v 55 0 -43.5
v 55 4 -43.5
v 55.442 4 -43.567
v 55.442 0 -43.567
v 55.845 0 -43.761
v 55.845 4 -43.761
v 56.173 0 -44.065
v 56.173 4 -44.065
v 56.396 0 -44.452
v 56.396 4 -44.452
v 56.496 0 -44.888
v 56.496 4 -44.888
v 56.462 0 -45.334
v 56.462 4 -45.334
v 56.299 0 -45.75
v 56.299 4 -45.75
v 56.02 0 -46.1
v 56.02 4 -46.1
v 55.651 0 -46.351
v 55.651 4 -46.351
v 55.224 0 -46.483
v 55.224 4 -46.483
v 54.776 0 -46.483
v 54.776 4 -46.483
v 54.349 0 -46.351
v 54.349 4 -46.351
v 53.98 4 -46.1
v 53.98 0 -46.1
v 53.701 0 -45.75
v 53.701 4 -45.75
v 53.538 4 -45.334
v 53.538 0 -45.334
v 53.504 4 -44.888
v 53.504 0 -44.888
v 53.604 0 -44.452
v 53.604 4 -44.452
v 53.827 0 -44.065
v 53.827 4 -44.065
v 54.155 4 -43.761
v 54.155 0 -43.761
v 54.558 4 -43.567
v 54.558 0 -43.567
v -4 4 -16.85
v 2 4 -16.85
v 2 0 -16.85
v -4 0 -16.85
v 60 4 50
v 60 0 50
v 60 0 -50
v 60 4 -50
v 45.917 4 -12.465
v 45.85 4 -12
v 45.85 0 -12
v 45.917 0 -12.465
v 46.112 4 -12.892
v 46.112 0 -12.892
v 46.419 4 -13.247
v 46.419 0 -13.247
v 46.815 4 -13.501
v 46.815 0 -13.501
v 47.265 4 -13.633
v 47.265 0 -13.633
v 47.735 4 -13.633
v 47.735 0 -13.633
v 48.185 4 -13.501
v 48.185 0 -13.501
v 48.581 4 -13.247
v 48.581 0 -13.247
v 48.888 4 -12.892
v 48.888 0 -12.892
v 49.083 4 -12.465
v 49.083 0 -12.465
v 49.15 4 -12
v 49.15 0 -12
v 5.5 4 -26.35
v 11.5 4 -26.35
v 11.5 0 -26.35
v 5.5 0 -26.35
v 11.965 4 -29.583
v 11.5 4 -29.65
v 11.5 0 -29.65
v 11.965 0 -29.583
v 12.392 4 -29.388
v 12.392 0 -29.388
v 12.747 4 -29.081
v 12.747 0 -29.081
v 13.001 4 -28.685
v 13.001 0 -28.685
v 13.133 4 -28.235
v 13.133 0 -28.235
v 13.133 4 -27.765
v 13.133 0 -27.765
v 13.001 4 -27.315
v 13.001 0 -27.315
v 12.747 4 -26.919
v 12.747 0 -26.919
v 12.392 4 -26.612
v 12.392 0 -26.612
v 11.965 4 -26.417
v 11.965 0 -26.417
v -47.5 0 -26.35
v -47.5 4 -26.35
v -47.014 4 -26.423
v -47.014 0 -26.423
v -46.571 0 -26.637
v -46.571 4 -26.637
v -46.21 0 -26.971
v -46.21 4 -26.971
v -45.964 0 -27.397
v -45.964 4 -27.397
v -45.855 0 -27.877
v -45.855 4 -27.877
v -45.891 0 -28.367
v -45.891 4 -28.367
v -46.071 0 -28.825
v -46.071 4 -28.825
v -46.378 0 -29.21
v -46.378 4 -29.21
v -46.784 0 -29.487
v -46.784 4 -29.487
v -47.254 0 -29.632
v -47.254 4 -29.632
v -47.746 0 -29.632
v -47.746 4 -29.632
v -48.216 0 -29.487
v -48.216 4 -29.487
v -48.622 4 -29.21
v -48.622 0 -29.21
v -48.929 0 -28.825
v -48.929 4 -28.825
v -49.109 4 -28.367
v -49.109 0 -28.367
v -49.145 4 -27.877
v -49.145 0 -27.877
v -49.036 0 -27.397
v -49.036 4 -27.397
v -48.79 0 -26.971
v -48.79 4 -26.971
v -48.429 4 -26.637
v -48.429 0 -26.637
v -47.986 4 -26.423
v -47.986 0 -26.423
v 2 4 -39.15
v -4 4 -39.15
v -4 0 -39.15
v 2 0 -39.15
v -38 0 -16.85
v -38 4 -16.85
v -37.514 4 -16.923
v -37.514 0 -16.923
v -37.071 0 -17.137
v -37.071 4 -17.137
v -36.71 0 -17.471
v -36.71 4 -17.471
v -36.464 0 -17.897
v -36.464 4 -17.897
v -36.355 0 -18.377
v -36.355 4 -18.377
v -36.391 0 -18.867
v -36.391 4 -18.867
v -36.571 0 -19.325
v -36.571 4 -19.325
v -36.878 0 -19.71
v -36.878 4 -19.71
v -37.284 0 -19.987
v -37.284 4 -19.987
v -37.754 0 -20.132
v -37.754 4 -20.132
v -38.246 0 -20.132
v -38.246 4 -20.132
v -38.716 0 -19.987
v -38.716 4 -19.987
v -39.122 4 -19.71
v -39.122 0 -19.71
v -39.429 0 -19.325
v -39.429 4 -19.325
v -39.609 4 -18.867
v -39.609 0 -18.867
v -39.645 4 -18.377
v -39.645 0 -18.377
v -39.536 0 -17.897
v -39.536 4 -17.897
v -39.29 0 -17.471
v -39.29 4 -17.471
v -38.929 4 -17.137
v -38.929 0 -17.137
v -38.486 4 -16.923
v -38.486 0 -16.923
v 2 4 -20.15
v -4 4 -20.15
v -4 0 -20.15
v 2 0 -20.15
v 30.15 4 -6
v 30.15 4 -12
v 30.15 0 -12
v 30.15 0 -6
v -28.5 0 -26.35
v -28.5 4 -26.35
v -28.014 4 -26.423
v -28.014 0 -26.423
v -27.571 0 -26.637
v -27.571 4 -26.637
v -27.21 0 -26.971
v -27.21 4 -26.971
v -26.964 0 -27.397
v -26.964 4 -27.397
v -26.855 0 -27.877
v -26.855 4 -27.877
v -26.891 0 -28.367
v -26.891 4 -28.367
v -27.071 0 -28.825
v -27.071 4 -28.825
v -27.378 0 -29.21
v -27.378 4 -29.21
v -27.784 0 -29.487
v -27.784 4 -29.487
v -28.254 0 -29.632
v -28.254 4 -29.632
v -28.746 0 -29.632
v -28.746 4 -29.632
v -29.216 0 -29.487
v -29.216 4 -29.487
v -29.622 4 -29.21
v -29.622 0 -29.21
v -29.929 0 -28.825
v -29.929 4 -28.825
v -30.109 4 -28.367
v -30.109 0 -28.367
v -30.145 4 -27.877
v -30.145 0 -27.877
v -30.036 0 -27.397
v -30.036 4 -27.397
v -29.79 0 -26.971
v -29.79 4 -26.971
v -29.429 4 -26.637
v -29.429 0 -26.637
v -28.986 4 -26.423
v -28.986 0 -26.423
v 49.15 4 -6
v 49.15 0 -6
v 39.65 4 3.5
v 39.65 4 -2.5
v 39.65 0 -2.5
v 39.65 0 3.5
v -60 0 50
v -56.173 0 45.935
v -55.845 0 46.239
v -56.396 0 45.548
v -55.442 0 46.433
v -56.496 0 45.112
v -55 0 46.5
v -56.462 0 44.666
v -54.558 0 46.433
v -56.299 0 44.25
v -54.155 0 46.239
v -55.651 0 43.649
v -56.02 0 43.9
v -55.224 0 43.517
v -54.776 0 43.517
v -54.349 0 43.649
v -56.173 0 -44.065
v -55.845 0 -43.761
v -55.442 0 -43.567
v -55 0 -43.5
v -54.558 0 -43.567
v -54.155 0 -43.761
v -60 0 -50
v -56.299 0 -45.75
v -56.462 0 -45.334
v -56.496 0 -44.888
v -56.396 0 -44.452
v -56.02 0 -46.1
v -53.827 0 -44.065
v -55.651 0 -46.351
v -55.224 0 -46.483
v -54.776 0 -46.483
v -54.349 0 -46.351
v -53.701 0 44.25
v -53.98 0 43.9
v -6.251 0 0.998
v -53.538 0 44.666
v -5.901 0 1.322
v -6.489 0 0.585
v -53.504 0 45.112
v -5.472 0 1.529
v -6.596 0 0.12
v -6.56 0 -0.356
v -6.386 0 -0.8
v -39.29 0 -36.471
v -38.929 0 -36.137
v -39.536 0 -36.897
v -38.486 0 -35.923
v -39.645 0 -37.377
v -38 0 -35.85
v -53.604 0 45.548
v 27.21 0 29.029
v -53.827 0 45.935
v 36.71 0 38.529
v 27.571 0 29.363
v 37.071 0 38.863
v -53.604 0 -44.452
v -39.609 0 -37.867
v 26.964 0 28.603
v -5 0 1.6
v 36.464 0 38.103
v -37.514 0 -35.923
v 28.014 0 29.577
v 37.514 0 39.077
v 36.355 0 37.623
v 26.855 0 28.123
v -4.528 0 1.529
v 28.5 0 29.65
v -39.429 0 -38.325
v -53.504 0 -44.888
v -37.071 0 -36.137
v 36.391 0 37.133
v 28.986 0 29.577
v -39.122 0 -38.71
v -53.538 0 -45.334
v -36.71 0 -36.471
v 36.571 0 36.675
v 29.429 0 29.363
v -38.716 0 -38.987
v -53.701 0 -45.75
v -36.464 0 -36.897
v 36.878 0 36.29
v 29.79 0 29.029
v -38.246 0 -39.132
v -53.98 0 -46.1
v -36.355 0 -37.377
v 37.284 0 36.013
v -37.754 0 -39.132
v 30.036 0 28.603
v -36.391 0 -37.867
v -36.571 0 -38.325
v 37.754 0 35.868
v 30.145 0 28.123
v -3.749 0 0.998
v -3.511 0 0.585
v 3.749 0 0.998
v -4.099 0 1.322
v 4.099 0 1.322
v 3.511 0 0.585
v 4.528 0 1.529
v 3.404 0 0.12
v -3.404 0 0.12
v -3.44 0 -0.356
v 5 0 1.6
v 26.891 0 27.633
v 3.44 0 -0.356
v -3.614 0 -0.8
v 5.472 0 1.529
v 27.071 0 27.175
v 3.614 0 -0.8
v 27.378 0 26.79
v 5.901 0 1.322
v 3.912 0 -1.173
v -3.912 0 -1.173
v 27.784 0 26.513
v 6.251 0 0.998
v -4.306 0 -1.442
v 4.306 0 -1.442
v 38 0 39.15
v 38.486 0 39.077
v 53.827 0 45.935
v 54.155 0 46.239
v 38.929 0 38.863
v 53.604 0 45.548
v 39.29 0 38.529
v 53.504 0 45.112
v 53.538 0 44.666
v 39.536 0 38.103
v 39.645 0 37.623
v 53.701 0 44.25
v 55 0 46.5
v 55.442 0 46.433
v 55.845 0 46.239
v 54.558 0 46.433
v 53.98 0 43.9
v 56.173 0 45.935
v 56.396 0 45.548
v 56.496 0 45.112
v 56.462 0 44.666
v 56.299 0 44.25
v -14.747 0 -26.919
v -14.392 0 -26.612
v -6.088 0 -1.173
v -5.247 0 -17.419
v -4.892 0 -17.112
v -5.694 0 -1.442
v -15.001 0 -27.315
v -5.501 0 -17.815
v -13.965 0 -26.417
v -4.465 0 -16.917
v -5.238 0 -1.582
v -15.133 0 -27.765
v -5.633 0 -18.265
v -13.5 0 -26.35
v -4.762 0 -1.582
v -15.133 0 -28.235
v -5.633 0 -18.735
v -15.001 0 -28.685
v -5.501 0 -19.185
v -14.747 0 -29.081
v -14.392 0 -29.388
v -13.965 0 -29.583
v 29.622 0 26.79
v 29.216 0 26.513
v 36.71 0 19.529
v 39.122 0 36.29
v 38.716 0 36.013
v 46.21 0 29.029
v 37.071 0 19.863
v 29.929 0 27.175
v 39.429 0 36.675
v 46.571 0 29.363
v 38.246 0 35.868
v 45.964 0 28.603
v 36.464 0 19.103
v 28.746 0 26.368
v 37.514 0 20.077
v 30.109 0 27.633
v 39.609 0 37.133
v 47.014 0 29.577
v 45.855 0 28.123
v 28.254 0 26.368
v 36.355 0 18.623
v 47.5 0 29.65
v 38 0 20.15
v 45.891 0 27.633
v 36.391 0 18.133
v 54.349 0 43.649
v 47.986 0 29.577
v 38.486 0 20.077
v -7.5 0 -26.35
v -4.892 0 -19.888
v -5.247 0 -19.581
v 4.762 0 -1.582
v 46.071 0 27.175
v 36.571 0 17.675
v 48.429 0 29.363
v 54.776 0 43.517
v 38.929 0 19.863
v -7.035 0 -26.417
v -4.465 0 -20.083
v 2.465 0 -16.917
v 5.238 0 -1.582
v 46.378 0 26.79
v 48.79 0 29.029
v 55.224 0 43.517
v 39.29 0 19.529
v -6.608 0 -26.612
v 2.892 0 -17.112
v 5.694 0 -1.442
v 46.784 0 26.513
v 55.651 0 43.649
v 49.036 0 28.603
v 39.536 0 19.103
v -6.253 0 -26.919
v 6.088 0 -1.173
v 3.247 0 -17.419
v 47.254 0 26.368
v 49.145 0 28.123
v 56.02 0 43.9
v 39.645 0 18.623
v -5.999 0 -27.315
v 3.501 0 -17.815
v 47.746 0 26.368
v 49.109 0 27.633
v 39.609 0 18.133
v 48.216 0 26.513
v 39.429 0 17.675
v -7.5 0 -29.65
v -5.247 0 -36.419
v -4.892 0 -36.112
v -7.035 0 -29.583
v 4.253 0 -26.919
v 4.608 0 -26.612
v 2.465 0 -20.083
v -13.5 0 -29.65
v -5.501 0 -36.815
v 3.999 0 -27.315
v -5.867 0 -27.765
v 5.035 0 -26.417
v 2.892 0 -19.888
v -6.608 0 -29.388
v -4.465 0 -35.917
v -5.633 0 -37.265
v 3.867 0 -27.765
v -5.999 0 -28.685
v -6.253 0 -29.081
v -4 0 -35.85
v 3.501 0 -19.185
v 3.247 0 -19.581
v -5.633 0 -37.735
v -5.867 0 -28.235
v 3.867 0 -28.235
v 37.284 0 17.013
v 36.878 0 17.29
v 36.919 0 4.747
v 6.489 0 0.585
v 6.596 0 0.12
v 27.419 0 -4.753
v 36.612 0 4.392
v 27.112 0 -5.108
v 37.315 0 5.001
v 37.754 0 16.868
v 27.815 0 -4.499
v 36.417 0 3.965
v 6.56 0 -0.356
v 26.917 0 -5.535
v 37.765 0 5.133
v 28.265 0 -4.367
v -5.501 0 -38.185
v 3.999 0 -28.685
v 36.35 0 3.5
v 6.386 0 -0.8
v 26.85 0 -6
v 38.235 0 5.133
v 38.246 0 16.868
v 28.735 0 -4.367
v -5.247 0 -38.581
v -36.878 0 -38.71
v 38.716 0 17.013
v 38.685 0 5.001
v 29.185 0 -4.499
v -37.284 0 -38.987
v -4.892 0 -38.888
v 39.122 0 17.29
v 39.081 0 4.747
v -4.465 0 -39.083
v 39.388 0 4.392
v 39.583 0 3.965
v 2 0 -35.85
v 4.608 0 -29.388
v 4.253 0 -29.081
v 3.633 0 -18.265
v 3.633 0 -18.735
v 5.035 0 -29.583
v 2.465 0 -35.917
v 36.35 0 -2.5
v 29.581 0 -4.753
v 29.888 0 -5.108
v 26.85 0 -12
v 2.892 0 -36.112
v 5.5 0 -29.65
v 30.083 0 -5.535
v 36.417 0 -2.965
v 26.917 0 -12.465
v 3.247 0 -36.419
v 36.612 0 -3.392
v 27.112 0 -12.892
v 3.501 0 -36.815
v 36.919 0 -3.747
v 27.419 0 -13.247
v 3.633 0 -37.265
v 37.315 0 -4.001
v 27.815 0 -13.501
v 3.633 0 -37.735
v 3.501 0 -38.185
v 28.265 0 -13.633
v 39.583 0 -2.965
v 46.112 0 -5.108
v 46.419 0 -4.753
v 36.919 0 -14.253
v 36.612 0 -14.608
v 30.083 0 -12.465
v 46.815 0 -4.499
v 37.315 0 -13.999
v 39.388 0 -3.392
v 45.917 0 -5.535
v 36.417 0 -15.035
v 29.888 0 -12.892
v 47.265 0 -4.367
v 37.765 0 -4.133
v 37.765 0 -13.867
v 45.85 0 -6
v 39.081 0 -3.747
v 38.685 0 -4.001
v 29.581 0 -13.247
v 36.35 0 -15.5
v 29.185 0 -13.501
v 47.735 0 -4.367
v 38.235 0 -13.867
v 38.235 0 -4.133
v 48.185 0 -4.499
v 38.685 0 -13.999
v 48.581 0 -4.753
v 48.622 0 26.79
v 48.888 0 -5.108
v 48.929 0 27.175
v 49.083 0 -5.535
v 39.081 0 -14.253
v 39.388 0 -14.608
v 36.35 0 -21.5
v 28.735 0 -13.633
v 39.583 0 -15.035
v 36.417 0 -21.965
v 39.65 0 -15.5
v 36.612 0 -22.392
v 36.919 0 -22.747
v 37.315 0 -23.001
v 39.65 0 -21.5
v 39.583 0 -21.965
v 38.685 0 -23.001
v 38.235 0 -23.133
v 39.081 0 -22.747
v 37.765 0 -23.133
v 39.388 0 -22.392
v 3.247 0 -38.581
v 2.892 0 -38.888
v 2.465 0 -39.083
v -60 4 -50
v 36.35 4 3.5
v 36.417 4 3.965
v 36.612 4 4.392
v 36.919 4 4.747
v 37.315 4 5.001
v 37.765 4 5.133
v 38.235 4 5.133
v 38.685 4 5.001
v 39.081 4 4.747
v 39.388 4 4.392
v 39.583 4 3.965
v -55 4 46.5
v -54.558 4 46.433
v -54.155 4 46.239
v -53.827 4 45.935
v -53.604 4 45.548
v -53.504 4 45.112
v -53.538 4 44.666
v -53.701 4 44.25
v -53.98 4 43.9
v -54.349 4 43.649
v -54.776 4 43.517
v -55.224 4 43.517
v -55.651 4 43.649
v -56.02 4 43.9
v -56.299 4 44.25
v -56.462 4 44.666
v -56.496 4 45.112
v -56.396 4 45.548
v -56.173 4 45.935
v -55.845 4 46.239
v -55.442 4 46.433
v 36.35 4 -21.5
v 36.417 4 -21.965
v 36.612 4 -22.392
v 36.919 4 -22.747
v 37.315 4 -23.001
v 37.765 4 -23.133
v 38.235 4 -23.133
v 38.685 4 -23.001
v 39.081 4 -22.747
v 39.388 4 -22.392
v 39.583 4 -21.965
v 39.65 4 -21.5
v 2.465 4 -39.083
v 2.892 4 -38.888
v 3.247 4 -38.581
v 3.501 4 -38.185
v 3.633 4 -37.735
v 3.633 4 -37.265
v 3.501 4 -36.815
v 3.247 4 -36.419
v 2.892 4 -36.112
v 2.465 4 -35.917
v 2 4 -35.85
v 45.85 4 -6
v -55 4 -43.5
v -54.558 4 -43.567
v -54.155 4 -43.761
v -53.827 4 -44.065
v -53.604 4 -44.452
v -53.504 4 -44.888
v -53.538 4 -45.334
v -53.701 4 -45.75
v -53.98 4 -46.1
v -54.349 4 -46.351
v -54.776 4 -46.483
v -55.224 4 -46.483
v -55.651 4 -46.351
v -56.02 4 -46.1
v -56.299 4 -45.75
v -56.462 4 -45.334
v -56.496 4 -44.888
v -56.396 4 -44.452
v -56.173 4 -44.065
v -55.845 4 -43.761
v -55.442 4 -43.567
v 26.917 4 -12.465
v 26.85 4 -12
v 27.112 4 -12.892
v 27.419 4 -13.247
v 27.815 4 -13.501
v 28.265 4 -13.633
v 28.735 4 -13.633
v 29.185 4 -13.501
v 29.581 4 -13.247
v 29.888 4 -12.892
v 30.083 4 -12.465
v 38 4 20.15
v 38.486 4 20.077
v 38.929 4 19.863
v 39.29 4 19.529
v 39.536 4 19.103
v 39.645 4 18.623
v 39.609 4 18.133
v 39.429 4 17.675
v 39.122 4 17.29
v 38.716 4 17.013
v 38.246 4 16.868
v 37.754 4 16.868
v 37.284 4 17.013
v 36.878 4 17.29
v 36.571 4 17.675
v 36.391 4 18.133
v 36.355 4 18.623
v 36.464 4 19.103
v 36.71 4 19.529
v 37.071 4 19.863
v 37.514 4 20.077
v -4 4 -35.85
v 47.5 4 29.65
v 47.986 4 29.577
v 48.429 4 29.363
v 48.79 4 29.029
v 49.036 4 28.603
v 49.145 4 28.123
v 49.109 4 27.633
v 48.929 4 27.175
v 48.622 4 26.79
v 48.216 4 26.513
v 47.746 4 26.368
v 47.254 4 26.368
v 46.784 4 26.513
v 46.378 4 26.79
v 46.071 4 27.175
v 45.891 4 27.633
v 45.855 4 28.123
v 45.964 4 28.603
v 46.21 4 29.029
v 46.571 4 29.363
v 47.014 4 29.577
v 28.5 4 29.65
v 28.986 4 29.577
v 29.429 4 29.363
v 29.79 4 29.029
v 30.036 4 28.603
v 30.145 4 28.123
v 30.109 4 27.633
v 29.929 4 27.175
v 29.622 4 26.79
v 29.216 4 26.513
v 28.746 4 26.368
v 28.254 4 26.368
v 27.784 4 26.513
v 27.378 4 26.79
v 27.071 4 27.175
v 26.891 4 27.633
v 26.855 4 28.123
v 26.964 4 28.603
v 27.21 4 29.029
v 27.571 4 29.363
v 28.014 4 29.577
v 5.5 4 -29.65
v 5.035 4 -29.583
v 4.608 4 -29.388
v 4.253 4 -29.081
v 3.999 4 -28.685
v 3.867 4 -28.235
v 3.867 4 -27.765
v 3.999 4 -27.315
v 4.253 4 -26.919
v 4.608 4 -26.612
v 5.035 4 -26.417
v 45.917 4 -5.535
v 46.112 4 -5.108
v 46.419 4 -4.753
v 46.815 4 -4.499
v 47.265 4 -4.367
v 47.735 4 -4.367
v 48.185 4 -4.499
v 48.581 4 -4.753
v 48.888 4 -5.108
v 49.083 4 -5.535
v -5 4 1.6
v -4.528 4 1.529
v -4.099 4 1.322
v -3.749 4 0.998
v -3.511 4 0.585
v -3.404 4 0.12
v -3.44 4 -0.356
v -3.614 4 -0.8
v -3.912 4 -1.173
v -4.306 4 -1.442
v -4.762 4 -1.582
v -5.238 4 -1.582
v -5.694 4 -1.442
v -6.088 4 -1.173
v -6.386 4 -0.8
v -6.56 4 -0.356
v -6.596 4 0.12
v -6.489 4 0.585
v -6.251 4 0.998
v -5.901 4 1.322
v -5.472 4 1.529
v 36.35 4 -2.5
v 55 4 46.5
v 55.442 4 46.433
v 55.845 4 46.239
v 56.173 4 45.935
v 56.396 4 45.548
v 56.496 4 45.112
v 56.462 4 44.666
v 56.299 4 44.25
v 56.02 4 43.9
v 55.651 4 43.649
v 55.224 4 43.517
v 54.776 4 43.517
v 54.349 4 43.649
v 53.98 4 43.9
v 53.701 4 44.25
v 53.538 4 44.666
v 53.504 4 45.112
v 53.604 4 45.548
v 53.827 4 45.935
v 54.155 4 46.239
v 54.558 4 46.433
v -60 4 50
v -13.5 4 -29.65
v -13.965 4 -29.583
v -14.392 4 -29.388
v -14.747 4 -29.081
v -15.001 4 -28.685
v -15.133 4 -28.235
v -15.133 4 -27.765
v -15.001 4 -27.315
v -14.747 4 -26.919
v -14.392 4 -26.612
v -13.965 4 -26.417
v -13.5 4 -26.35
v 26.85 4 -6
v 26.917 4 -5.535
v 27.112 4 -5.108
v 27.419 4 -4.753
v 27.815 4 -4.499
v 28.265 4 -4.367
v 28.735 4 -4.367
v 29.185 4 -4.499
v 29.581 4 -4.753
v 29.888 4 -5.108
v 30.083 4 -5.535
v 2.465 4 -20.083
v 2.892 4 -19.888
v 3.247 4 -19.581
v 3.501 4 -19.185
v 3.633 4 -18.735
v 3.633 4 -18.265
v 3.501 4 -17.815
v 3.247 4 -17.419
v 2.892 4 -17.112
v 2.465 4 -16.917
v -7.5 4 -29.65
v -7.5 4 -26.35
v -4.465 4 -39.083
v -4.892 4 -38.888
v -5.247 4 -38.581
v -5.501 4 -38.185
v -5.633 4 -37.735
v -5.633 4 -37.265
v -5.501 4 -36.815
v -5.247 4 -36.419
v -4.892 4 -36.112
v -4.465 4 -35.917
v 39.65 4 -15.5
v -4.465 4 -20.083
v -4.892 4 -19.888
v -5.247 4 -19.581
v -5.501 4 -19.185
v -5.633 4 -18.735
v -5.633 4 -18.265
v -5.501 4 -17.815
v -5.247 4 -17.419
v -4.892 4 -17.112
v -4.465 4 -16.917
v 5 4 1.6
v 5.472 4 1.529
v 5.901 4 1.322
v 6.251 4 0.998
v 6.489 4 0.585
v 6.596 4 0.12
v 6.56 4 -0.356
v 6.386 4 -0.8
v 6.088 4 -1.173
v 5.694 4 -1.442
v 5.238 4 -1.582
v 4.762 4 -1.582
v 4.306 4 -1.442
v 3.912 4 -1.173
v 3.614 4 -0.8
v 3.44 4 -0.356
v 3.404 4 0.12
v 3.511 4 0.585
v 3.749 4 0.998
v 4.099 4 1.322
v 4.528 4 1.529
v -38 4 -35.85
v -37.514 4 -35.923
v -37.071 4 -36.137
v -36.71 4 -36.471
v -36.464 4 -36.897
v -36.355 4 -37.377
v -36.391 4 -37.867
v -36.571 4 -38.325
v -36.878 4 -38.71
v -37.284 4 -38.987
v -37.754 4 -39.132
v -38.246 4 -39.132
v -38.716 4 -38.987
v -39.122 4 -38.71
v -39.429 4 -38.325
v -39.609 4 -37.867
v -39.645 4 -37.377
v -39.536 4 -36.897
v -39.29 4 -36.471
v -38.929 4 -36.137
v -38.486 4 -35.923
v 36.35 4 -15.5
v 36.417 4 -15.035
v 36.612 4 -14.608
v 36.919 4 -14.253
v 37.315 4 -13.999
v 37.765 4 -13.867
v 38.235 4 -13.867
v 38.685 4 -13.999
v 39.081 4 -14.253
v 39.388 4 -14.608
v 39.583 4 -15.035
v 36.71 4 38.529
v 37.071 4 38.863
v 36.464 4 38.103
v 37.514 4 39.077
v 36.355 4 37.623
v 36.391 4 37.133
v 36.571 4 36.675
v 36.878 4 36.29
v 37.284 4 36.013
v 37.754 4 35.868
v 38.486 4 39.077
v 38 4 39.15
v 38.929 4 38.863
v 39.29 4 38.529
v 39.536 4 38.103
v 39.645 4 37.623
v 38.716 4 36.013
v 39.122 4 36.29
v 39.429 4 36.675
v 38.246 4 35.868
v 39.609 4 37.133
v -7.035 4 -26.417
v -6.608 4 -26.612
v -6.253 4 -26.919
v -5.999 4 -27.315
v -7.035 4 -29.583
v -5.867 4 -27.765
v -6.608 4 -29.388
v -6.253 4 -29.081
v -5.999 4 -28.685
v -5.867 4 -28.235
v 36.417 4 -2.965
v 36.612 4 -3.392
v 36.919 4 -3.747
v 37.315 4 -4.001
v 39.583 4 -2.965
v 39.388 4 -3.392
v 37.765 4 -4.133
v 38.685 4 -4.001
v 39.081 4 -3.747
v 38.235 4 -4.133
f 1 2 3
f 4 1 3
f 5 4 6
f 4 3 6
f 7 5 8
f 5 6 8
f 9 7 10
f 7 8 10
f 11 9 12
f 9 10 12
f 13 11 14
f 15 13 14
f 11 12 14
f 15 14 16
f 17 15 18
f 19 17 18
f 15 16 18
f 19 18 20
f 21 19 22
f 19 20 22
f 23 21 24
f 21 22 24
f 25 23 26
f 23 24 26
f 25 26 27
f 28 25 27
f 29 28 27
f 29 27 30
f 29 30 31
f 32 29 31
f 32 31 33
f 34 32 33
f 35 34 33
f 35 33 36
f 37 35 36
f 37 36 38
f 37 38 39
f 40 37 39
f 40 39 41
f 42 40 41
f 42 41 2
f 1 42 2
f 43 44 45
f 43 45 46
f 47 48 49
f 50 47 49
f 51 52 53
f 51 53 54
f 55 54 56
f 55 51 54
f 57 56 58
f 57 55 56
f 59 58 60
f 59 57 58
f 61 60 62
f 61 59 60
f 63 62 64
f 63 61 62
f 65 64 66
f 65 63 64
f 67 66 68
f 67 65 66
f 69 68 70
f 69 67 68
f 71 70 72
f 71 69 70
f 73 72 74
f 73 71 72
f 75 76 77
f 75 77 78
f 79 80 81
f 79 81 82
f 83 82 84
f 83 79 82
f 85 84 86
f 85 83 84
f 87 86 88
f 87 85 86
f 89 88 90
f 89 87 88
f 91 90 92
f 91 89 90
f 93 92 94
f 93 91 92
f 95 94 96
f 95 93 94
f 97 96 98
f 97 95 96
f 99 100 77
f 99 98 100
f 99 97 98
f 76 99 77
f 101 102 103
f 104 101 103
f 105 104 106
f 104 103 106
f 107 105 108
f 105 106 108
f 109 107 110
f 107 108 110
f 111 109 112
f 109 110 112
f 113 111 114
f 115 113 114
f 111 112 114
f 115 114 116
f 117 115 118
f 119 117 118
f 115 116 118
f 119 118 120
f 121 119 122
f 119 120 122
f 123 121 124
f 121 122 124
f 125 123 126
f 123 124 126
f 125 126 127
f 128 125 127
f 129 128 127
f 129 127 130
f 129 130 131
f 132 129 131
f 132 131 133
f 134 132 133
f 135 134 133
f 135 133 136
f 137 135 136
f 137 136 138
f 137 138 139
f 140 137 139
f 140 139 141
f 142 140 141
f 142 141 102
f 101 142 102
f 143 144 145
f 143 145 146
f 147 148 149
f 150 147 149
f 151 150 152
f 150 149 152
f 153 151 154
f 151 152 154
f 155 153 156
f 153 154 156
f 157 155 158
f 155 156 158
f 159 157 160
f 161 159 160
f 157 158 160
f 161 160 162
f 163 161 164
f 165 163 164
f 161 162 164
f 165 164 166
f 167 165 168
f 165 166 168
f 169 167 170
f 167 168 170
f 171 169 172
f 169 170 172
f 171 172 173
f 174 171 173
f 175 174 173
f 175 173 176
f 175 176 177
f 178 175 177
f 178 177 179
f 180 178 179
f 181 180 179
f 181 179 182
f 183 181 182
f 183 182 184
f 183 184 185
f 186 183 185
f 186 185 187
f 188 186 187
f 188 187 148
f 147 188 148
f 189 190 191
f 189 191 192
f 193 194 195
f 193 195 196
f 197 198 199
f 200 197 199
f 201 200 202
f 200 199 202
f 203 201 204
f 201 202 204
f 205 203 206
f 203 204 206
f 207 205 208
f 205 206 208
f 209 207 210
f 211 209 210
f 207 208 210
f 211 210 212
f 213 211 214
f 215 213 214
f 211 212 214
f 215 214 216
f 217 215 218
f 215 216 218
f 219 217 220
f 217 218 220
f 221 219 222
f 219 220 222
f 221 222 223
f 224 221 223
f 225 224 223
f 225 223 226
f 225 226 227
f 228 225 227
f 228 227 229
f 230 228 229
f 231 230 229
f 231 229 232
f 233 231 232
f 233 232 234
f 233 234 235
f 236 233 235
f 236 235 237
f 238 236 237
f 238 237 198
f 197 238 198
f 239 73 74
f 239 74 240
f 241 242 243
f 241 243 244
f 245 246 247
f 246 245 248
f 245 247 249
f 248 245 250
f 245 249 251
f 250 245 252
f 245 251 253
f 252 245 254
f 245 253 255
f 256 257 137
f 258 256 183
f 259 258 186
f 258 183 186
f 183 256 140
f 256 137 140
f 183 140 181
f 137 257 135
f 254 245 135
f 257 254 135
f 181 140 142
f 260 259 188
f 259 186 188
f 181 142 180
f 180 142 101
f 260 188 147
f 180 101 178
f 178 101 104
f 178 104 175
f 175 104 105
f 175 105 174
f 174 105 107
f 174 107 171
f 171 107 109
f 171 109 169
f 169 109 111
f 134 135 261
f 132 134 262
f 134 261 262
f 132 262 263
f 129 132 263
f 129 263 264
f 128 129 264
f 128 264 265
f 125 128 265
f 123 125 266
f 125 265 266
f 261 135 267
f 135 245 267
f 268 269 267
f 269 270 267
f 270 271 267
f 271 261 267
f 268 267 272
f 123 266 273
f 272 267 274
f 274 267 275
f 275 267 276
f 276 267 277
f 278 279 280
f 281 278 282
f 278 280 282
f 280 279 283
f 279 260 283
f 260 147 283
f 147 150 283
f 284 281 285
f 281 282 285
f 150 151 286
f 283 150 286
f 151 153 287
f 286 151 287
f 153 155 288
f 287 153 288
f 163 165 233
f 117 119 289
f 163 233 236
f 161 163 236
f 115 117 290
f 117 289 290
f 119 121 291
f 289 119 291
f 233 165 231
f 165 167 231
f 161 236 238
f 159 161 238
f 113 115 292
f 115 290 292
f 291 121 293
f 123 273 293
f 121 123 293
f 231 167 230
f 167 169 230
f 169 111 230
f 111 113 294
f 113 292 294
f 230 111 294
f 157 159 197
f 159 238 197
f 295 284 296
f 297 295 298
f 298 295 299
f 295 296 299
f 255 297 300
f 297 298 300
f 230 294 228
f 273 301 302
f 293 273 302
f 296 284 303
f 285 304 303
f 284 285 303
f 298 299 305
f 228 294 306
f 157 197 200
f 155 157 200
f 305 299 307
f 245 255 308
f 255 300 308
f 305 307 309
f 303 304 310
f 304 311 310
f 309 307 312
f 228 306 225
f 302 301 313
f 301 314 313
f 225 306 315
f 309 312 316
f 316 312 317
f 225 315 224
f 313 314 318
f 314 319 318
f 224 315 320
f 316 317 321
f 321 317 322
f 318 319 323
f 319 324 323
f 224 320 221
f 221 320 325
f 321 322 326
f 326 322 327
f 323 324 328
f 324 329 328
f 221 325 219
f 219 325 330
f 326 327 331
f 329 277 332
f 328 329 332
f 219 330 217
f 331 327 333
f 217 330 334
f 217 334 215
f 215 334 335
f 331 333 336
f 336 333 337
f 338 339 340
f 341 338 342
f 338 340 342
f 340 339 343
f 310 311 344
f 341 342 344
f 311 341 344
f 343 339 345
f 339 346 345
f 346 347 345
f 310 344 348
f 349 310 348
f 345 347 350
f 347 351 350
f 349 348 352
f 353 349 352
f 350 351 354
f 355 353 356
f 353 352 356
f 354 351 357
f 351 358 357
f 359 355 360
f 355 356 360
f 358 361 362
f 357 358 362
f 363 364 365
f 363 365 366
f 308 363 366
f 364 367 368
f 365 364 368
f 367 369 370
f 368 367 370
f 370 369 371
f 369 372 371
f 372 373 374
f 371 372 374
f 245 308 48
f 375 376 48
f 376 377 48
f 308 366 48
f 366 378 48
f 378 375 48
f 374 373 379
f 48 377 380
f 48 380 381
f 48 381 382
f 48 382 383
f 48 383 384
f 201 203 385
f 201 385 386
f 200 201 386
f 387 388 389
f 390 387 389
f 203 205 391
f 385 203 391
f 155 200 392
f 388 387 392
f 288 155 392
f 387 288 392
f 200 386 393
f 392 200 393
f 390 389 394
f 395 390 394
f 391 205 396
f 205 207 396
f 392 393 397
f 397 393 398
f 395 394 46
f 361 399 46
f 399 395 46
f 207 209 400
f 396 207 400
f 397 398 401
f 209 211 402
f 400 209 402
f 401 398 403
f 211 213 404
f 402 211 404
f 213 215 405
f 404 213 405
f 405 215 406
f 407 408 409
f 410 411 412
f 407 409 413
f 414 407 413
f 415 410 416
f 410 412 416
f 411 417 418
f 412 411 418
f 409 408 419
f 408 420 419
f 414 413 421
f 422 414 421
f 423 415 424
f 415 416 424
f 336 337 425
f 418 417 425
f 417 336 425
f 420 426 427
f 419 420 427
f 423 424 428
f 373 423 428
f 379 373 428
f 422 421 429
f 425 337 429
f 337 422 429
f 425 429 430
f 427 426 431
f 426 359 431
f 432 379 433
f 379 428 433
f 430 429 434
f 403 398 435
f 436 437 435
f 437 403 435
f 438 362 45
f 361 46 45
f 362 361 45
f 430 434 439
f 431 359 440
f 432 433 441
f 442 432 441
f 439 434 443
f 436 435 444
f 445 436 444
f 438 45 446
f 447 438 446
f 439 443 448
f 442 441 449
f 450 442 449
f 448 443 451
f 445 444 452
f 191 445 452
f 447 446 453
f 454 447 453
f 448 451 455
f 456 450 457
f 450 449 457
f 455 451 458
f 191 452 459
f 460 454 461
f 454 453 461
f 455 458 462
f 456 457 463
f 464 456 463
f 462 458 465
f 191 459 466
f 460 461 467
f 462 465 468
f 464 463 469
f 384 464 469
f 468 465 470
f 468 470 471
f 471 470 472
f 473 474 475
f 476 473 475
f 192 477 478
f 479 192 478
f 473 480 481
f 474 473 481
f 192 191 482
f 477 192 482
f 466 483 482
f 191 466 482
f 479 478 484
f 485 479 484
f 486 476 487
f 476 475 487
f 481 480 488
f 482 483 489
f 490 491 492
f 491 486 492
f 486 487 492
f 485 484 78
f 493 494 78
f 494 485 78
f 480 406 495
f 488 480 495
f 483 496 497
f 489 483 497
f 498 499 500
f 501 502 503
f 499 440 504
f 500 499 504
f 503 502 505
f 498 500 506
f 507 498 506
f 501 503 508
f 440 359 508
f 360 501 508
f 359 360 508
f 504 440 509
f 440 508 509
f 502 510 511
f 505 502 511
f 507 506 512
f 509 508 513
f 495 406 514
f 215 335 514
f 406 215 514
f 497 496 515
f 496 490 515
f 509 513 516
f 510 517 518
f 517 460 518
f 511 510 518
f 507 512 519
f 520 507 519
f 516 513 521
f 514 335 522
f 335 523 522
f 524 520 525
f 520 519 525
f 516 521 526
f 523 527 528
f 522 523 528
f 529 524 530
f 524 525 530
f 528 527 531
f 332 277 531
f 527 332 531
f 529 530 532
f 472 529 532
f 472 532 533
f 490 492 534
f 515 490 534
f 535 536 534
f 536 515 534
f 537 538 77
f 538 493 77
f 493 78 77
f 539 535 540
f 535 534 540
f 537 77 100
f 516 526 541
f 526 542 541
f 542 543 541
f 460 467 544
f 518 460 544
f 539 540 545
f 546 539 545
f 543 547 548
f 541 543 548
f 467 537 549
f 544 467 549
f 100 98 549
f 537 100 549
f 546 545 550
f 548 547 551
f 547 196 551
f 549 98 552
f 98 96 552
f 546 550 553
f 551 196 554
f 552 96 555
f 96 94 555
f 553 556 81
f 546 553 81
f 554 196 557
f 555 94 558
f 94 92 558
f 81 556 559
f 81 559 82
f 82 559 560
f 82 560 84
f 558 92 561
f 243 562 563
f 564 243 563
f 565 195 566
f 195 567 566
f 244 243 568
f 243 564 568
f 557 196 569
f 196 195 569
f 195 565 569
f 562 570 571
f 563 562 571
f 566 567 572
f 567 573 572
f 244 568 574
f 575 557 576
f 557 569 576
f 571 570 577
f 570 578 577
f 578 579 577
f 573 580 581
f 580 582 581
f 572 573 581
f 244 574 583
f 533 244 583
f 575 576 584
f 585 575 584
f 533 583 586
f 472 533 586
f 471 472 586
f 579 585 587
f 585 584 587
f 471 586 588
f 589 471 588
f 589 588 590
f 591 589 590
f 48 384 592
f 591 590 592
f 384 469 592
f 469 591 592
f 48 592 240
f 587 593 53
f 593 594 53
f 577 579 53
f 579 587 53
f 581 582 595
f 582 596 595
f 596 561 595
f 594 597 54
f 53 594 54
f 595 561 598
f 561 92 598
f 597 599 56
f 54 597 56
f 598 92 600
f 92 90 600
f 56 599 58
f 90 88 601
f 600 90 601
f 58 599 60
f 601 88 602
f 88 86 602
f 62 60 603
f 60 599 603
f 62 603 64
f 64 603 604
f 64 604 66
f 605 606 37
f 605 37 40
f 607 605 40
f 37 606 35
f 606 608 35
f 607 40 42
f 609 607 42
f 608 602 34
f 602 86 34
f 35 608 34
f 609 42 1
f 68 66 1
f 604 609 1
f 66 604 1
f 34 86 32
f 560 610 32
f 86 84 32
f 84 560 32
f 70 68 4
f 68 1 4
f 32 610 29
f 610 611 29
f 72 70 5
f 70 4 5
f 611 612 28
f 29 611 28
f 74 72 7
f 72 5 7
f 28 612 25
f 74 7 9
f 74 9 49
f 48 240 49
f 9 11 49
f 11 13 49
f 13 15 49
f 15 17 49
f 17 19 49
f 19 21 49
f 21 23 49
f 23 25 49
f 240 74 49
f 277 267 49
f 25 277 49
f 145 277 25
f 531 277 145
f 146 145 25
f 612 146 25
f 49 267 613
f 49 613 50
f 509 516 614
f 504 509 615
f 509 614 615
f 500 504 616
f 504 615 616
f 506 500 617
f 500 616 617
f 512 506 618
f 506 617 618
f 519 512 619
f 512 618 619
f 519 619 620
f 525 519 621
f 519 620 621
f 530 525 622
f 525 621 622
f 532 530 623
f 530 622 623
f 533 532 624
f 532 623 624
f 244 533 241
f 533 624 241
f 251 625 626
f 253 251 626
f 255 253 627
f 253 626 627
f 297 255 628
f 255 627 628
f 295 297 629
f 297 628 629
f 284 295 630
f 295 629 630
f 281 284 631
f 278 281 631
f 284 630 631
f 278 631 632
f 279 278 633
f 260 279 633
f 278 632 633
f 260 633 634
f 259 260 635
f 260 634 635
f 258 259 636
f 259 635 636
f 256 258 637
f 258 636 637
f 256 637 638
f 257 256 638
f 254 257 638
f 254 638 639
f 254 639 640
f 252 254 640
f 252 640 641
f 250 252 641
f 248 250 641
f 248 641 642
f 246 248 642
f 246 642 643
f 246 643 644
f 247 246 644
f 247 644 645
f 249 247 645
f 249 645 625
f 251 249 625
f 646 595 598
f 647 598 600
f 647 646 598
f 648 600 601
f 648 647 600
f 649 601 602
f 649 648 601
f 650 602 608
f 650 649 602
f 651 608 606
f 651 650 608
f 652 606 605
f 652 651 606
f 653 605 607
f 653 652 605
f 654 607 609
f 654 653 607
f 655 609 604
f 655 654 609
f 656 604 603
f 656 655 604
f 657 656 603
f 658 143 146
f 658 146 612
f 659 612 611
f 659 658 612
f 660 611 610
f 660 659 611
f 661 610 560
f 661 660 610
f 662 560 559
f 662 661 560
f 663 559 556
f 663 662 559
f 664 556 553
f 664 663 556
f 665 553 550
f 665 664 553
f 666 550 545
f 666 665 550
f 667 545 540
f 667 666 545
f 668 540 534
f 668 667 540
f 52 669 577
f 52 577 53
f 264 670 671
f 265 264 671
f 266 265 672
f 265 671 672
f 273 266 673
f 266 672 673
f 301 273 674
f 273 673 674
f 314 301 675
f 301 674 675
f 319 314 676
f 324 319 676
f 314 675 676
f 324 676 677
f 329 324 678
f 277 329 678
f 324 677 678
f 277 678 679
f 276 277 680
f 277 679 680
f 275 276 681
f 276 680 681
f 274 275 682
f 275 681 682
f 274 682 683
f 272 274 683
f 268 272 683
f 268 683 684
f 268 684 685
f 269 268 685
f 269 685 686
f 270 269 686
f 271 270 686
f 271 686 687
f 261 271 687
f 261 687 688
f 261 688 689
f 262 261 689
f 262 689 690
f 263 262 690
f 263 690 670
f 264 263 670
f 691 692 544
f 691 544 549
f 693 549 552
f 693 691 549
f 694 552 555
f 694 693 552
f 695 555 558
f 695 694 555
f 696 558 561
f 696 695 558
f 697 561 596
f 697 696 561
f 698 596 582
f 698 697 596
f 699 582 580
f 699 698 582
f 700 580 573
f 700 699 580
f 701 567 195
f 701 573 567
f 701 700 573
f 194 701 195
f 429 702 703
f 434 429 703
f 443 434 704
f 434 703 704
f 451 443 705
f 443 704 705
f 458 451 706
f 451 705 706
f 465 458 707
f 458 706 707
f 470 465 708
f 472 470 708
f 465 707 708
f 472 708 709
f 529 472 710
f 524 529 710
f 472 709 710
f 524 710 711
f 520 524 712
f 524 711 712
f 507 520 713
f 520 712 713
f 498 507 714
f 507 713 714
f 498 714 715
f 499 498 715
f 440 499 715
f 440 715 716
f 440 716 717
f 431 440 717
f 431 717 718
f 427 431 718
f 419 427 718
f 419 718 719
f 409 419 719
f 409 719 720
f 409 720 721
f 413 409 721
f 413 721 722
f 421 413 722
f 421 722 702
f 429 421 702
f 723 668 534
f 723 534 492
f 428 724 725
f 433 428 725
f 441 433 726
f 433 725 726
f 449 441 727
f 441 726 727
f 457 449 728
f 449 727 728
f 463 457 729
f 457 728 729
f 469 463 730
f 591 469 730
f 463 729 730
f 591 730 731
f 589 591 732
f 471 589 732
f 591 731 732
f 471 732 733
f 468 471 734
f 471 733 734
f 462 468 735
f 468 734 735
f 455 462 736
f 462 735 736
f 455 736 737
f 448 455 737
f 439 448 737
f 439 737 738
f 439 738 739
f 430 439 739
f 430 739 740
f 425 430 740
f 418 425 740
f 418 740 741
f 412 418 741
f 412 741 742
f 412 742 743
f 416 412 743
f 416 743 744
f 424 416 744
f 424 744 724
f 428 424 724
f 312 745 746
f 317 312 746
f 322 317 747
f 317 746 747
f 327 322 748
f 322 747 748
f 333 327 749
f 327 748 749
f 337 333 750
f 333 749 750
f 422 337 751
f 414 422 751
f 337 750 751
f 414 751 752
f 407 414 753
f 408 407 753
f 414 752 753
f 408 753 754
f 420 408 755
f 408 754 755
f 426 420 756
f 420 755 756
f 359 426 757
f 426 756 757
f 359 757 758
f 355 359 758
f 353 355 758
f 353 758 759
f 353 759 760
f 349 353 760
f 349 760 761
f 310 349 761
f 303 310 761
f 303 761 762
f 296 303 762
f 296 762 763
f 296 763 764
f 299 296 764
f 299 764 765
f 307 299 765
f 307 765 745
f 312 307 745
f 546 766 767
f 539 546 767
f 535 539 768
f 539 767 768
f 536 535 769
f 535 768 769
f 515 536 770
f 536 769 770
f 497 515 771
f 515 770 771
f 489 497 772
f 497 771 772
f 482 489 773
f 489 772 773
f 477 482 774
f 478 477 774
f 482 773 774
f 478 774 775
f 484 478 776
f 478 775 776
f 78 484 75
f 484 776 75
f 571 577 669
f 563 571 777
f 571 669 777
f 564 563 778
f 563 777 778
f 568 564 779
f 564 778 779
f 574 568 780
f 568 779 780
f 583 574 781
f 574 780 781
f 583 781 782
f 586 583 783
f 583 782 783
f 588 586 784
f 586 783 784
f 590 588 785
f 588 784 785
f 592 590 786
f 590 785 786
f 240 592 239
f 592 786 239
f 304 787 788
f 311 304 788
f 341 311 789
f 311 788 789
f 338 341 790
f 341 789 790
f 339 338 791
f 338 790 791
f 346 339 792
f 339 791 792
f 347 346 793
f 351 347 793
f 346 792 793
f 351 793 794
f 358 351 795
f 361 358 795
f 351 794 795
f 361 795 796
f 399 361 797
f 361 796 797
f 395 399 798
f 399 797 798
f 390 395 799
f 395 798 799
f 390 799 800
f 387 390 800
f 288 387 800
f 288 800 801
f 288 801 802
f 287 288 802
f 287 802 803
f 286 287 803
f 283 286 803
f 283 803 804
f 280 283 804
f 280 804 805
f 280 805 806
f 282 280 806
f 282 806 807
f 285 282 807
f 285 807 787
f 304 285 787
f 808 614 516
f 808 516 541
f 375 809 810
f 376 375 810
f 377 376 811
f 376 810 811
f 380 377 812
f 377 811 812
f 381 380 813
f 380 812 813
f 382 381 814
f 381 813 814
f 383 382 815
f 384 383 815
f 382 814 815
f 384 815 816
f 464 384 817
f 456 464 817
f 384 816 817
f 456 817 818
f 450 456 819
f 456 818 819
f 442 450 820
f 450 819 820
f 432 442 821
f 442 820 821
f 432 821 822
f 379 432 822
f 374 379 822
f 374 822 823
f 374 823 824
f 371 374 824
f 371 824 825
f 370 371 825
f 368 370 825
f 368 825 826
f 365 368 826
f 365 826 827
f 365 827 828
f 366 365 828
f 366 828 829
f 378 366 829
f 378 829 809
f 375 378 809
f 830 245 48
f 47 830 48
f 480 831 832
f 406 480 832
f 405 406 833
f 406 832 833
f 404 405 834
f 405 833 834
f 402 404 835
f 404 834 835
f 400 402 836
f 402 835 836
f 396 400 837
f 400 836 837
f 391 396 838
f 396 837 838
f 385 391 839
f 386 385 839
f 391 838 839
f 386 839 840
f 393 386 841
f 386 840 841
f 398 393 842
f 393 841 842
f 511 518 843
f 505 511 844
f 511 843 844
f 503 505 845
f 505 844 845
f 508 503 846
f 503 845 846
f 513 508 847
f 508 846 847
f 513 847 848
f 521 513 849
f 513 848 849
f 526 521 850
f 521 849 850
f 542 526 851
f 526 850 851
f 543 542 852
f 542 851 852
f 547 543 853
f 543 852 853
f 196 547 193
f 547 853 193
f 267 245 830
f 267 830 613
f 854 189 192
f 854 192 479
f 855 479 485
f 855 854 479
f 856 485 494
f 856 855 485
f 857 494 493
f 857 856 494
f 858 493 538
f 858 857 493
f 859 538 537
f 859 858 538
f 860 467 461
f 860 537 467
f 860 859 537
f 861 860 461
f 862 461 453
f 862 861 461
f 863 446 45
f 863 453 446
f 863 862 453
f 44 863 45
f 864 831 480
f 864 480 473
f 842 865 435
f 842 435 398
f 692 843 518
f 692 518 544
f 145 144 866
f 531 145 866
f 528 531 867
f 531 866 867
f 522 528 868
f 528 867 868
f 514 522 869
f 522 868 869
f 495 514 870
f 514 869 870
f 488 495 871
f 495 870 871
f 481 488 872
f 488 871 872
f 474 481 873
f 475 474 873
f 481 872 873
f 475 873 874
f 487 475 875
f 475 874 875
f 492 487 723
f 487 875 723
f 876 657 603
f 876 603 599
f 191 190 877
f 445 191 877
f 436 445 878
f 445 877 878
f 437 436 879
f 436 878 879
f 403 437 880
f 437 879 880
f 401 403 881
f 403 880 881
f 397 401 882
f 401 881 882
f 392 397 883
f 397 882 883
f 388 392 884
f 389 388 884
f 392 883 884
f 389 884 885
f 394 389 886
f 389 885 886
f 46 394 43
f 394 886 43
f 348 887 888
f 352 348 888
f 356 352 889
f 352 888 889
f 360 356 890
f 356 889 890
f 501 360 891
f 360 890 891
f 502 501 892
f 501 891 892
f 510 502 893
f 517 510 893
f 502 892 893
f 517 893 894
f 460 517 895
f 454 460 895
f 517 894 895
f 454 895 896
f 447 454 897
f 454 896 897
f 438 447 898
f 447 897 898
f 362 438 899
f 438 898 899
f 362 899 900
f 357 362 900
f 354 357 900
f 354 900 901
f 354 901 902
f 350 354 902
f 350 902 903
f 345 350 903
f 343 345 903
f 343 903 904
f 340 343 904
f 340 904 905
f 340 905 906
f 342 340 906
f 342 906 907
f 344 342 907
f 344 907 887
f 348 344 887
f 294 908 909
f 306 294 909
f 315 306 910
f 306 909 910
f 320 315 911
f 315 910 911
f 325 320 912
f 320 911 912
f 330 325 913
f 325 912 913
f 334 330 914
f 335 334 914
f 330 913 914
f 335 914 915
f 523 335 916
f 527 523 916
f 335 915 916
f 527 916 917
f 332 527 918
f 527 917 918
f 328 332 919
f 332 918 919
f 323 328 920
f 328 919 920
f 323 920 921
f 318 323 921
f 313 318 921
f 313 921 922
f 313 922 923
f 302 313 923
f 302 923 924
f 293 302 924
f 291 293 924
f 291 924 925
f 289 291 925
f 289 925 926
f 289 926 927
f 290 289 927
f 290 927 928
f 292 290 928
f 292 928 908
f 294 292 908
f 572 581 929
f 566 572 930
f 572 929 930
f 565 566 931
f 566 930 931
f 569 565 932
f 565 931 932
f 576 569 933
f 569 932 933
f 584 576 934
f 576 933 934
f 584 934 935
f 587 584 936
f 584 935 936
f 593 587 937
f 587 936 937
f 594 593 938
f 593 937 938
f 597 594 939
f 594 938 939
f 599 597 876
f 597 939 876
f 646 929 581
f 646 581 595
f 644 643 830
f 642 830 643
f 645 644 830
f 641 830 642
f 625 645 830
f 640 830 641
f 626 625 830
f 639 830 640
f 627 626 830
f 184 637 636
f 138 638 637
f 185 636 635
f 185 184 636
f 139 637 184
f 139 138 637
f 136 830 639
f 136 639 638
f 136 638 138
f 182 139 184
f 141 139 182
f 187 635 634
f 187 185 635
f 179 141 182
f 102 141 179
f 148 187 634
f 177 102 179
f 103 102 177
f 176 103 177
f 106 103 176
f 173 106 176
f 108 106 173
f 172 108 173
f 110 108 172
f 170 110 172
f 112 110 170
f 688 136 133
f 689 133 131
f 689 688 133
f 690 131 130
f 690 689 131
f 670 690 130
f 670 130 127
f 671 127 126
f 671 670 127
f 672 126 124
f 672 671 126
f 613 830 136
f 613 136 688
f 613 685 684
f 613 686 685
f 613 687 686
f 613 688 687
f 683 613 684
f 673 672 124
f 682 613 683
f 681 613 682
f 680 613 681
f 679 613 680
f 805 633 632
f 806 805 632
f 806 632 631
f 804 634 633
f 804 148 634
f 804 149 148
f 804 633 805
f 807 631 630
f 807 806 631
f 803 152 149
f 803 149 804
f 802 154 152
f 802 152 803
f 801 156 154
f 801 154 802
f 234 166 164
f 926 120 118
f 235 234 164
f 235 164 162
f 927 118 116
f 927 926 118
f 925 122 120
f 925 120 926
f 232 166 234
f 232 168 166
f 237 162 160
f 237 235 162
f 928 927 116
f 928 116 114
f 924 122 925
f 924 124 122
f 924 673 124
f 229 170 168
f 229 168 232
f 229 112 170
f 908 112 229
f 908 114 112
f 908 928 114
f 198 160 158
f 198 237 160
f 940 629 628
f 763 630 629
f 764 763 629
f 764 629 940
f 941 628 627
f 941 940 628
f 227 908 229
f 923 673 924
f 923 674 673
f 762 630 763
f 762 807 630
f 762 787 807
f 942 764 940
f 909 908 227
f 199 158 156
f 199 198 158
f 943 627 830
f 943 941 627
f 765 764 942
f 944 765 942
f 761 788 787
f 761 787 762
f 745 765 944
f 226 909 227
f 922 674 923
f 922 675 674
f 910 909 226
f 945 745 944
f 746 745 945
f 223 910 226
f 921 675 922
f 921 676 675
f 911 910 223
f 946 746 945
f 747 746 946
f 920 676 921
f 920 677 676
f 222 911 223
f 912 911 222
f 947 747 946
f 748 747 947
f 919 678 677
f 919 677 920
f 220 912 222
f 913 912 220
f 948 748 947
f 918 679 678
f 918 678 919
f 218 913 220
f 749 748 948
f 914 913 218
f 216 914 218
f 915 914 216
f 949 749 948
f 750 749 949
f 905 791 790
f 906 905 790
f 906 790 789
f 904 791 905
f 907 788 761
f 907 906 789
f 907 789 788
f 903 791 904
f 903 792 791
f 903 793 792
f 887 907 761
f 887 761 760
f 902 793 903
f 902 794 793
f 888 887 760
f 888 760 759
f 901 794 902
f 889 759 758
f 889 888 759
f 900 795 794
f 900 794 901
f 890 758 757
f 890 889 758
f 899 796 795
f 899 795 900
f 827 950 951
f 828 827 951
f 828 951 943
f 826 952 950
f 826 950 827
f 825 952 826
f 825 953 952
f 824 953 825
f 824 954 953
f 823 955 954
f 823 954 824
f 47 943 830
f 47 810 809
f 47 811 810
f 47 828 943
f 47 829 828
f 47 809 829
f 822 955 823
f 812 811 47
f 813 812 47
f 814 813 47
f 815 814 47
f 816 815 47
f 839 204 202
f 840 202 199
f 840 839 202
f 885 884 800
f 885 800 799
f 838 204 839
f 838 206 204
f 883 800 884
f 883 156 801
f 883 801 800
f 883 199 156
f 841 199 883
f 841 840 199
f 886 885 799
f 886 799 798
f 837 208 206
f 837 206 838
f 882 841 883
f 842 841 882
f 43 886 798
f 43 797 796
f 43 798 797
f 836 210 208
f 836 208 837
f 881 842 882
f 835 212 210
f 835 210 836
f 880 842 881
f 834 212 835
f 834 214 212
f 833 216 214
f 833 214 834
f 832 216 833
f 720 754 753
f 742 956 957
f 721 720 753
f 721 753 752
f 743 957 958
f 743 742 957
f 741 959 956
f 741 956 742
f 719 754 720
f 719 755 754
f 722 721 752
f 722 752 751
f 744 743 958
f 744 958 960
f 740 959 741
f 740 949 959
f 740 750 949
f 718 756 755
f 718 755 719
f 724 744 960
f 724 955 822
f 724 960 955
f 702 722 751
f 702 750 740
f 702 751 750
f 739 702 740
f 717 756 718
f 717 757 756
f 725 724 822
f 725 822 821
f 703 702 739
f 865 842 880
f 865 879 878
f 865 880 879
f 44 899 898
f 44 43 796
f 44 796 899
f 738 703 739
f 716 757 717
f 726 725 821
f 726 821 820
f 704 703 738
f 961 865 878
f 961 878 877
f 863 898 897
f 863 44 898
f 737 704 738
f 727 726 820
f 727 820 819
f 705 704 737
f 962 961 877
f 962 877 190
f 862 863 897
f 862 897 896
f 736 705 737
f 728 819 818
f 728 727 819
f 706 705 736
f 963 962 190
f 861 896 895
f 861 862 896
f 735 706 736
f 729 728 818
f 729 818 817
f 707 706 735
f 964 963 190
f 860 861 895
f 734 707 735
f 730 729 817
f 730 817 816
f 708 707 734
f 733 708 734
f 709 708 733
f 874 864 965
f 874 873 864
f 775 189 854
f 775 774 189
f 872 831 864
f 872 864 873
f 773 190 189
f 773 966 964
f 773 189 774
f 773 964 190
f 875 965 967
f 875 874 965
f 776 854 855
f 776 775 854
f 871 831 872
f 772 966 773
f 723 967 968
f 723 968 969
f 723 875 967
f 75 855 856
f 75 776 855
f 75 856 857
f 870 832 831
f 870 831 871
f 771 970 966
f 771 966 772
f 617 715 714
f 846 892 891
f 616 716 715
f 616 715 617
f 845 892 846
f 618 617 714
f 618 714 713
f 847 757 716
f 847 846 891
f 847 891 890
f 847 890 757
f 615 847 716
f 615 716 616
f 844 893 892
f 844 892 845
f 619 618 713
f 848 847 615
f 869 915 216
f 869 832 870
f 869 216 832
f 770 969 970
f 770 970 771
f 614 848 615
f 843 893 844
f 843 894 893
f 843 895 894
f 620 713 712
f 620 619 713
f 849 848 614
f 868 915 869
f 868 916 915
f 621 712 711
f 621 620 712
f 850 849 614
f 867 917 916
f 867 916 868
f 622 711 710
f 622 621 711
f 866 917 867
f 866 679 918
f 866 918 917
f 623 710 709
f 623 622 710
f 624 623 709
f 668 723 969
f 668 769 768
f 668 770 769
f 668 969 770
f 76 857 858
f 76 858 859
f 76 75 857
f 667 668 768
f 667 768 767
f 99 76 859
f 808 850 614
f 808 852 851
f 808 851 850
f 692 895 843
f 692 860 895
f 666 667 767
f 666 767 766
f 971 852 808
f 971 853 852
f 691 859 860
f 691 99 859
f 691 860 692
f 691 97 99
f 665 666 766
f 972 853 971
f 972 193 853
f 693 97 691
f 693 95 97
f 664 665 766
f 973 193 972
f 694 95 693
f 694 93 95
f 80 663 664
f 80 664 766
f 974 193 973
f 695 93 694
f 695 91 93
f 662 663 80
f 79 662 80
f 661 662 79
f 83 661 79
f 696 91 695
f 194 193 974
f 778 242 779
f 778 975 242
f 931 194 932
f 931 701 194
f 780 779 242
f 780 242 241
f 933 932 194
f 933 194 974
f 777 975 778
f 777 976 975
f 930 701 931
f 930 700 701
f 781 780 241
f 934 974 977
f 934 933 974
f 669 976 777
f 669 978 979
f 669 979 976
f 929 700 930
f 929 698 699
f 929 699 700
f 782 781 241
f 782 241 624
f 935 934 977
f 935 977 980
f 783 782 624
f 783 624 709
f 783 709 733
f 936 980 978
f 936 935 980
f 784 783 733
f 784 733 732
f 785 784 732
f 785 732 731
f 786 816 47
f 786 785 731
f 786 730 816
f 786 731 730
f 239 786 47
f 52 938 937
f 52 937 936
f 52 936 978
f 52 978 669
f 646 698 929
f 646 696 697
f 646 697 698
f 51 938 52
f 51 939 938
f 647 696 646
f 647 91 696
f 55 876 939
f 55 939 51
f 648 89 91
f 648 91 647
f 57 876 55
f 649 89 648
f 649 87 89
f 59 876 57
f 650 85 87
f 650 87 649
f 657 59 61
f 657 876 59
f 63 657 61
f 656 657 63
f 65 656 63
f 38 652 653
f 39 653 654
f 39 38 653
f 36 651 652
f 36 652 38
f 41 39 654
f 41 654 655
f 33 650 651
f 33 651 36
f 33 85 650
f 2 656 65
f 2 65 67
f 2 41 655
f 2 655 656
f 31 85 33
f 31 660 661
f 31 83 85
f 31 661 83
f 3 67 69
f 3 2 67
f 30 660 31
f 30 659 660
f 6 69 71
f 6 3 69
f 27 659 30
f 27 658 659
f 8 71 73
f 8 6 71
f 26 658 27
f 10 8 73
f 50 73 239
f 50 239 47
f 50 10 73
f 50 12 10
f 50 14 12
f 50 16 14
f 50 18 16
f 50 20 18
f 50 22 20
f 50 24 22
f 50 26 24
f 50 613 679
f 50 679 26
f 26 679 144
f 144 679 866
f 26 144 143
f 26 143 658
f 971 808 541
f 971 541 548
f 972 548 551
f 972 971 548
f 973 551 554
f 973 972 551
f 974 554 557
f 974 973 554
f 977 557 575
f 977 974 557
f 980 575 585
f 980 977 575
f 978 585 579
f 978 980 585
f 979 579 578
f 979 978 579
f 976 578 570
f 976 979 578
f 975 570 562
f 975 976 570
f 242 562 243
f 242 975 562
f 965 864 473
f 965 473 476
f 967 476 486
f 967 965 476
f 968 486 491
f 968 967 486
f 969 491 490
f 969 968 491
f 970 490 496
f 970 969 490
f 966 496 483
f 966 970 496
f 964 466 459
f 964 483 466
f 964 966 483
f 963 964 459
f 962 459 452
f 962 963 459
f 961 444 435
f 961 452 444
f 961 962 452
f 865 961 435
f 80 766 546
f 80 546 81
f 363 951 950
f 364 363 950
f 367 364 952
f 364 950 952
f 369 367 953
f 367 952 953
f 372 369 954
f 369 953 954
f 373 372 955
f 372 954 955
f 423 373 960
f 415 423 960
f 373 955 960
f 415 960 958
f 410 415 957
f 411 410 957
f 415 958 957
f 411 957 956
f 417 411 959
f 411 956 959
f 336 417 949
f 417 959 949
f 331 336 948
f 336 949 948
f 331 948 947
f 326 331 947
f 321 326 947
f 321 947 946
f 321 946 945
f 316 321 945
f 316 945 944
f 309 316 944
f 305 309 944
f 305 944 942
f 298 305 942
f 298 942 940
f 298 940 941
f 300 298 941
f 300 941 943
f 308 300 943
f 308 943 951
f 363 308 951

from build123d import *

# Parameters (mm, degrees)
SKETCH2_W           = 120
SKETCH2_H           = 100
BOSS_EXTRUDE1_DEPTH = 4
SKETCH3_R           = 1.5
CUT_EXTRUDE1_DEPTH  = 5
SKETCH4_R           = 1.65
CUT_EXTRUDE2_DEPTH  = 5
SKETCH6_R           = 1.6
CUT_EXTRUDE3_DEPTH  = 5
CUT_EXTRUDE4_DEPTH  = 21


with BuildPart() as part:
    # Sketch2 → Boss-Extrude1 (new body)
    with BuildSketch(Plane(origin=(0, 0, 0), x_dir=(1, 0, 0), z_dir=(0, 1, 0))):
        Rectangle(SKETCH2_W, SKETCH2_H)
    extrude(amount=BOSS_EXTRUDE1_DEPTH)

    # Sketch3 → Cut-Extrude1 (cut)
    with BuildSketch(Plane(origin=(0, 4, 0), x_dir=(1, 0, 0), z_dir=(0, 1, 0))):
        with Locations(Location((-55, 45, 0), (0, 0, 270))):
            Circle(SKETCH3_R)
        with Locations(Location((55, 45, 0), (0, 0, 270))):
            Circle(SKETCH3_R)
        with Locations(Location((55, -45, 0), (0, 0, 270))):
            Circle(SKETCH3_R)
        with Locations(Location((-55, -45, 0), (0, 0, 270))):
            Circle(SKETCH3_R)
    extrude(amount=-CUT_EXTRUDE1_DEPTH, mode=Mode.SUBTRACT)

    # Sketch4 → Cut-Extrude2 (cut)
    with BuildSketch(Plane(origin=(0, 4, 0), x_dir=(1, 0, 0), z_dir=(0, 1, 0))):
        with Locations(Location((-38, 37.5, 0), (0, 0, 270))):
            Circle(SKETCH4_R)
        with Locations(Location((-4, 37.5, 0), (0, 0, 270))):
            Circle(SKETCH4_R)
        with Locations(Location((38, 15.5, 0), (0, 0, 270))):
            Circle(SKETCH4_R)
        with Locations(Location((38, -18.5, 0), (0, 0, 270))):
            Circle(SKETCH4_R)
        with Locations(Location((-28.5, 28, 0), (0, 0, 270))):
            Circle(SKETCH4_R)
        with Locations(Location((-38, 18.5, 0), (0, 0, 270))):
            Circle(SKETCH4_R)
        with Locations(Location((-47.5, 28, 0), (0, 0, 270))):
            Circle(SKETCH4_R)
        with Locations(Location((5.5, 28, 0), (0, 0, 270))):
            Circle(SKETCH4_R)
        with Locations(Location((-4, 18.5, 0), (0, 0, 270))):
            Circle(SKETCH4_R)
        with Locations(Location((-13.5, 28, 0), (0, 0, 270))):
            Circle(SKETCH4_R)
        with Locations(Location((47.5, 6, 0), (0, 0, 270))):
            Circle(SKETCH4_R)
        with Locations(Location((38, -3.5, 0), (0, 0, 270))):
            Circle(SKETCH4_R)
        with Locations(Location((28.5, 6, 0), (0, 0, 270))):
            Circle(SKETCH4_R)
        with Locations(Location((47.5, -28, 0), (0, 0, 270))):
            Circle(SKETCH4_R)
        with Locations(Location((38, -37.5, 0), (0, 0, 270))):
            Circle(SKETCH4_R)
        with Locations(Location((28.5, -28, 0), (0, 0, 270))):
            Circle(SKETCH4_R)
    extrude(amount=-CUT_EXTRUDE2_DEPTH, mode=Mode.SUBTRACT)

    # Sketch6 → Cut-Extrude3 (cut)
    with BuildSketch(Plane(origin=(0, 4, 0), x_dir=(1, 0, 0), z_dir=(0, 1, 0))):
        with Locations(Location((5, 0, 0), (0, 0, 270))):
            Circle(SKETCH6_R)
        with Locations(Location((-5, 0, 0), (0, 0, 270))):
            Circle(SKETCH6_R)
    extrude(amount=-CUT_EXTRUDE3_DEPTH, mode=Mode.SUBTRACT)

    # Sketch7 → Cut-Extrude4 (cut)
    with BuildSketch(Plane(origin=(0, 4, 0), x_dir=(1, 0, 0), z_dir=(0, 1, 0))):
        with BuildLine():
            Line((-4, 39.15), (2, 39.15))
            ThreePointArc((2, 39.15), (3.65, 37.5), (2, 35.85))
            Line((2, 35.85), (-4, 35.85))
            ThreePointArc((-4, 35.85), (-5.65, 37.5), (-4, 39.15))
        make_face()
        with BuildLine():
            Line((5.5, 29.65), (11.5, 29.65))
            ThreePointArc((11.5, 29.65), (13.15, 28), (11.5, 26.35))
            Line((11.5, 26.35), (5.5, 26.35))
            ThreePointArc((5.5, 26.35), (3.85, 28), (5.5, 29.65))
        make_face()
        with BuildLine():
            Line((-4, 20.15), (2, 20.15))
            ThreePointArc((2, 20.15), (3.65, 18.5), (2, 16.85))
            Line((2, 16.85), (-4, 16.85))
            ThreePointArc((-4, 16.85), (-5.65, 18.5), (-4, 20.15))
        make_face()
        with BuildLine():
            Line((-13.5, 29.65), (-7.5, 29.65))
            ThreePointArc((-7.5, 29.65), (-5.85, 28), (-7.5, 26.35))
            Line((-7.5, 26.35), (-13.5, 26.35))
            ThreePointArc((-13.5, 26.35), (-15.15, 28), (-13.5, 29.65))
        make_face()
        with BuildLine():
            Line((36.35, 15.5), (36.35, 21.5))
            ThreePointArc((36.35, 21.5), (38, 23.15), (39.65, 21.5))
            Line((39.65, 21.5), (39.65, 15.5))
            ThreePointArc((39.65, 15.5), (38, 13.85), (36.35, 15.5))
        make_face()
        with BuildLine():
            Line((45.85, 6), (45.85, 12))
            ThreePointArc((45.85, 12), (47.5, 13.65), (49.15, 12))
            Line((49.15, 12), (49.15, 6))
            ThreePointArc((49.15, 6), (47.5, 4.35), (45.85, 6))
        make_face()
        with BuildLine():
            Line((36.35, -3.5), (36.35, 2.5))
            ThreePointArc((36.35, 2.5), (38, 4.15), (39.65, 2.5))
            Line((39.65, 2.5), (39.65, -3.5))
            ThreePointArc((39.65, -3.5), (38, -5.15), (36.35, -3.5))
        make_face()
        with BuildLine():
            Line((26.85, 6), (26.85, 12))
            ThreePointArc((26.85, 12), (28.5, 13.65), (30.15, 12))
            Line((30.15, 12), (30.15, 6))
            ThreePointArc((30.15, 6), (28.5, 4.35), (26.85, 6))
        make_face()
    extrude(amount=-CUT_EXTRUDE4_DEPTH, mode=Mode.SUBTRACT)


solid = part.part
